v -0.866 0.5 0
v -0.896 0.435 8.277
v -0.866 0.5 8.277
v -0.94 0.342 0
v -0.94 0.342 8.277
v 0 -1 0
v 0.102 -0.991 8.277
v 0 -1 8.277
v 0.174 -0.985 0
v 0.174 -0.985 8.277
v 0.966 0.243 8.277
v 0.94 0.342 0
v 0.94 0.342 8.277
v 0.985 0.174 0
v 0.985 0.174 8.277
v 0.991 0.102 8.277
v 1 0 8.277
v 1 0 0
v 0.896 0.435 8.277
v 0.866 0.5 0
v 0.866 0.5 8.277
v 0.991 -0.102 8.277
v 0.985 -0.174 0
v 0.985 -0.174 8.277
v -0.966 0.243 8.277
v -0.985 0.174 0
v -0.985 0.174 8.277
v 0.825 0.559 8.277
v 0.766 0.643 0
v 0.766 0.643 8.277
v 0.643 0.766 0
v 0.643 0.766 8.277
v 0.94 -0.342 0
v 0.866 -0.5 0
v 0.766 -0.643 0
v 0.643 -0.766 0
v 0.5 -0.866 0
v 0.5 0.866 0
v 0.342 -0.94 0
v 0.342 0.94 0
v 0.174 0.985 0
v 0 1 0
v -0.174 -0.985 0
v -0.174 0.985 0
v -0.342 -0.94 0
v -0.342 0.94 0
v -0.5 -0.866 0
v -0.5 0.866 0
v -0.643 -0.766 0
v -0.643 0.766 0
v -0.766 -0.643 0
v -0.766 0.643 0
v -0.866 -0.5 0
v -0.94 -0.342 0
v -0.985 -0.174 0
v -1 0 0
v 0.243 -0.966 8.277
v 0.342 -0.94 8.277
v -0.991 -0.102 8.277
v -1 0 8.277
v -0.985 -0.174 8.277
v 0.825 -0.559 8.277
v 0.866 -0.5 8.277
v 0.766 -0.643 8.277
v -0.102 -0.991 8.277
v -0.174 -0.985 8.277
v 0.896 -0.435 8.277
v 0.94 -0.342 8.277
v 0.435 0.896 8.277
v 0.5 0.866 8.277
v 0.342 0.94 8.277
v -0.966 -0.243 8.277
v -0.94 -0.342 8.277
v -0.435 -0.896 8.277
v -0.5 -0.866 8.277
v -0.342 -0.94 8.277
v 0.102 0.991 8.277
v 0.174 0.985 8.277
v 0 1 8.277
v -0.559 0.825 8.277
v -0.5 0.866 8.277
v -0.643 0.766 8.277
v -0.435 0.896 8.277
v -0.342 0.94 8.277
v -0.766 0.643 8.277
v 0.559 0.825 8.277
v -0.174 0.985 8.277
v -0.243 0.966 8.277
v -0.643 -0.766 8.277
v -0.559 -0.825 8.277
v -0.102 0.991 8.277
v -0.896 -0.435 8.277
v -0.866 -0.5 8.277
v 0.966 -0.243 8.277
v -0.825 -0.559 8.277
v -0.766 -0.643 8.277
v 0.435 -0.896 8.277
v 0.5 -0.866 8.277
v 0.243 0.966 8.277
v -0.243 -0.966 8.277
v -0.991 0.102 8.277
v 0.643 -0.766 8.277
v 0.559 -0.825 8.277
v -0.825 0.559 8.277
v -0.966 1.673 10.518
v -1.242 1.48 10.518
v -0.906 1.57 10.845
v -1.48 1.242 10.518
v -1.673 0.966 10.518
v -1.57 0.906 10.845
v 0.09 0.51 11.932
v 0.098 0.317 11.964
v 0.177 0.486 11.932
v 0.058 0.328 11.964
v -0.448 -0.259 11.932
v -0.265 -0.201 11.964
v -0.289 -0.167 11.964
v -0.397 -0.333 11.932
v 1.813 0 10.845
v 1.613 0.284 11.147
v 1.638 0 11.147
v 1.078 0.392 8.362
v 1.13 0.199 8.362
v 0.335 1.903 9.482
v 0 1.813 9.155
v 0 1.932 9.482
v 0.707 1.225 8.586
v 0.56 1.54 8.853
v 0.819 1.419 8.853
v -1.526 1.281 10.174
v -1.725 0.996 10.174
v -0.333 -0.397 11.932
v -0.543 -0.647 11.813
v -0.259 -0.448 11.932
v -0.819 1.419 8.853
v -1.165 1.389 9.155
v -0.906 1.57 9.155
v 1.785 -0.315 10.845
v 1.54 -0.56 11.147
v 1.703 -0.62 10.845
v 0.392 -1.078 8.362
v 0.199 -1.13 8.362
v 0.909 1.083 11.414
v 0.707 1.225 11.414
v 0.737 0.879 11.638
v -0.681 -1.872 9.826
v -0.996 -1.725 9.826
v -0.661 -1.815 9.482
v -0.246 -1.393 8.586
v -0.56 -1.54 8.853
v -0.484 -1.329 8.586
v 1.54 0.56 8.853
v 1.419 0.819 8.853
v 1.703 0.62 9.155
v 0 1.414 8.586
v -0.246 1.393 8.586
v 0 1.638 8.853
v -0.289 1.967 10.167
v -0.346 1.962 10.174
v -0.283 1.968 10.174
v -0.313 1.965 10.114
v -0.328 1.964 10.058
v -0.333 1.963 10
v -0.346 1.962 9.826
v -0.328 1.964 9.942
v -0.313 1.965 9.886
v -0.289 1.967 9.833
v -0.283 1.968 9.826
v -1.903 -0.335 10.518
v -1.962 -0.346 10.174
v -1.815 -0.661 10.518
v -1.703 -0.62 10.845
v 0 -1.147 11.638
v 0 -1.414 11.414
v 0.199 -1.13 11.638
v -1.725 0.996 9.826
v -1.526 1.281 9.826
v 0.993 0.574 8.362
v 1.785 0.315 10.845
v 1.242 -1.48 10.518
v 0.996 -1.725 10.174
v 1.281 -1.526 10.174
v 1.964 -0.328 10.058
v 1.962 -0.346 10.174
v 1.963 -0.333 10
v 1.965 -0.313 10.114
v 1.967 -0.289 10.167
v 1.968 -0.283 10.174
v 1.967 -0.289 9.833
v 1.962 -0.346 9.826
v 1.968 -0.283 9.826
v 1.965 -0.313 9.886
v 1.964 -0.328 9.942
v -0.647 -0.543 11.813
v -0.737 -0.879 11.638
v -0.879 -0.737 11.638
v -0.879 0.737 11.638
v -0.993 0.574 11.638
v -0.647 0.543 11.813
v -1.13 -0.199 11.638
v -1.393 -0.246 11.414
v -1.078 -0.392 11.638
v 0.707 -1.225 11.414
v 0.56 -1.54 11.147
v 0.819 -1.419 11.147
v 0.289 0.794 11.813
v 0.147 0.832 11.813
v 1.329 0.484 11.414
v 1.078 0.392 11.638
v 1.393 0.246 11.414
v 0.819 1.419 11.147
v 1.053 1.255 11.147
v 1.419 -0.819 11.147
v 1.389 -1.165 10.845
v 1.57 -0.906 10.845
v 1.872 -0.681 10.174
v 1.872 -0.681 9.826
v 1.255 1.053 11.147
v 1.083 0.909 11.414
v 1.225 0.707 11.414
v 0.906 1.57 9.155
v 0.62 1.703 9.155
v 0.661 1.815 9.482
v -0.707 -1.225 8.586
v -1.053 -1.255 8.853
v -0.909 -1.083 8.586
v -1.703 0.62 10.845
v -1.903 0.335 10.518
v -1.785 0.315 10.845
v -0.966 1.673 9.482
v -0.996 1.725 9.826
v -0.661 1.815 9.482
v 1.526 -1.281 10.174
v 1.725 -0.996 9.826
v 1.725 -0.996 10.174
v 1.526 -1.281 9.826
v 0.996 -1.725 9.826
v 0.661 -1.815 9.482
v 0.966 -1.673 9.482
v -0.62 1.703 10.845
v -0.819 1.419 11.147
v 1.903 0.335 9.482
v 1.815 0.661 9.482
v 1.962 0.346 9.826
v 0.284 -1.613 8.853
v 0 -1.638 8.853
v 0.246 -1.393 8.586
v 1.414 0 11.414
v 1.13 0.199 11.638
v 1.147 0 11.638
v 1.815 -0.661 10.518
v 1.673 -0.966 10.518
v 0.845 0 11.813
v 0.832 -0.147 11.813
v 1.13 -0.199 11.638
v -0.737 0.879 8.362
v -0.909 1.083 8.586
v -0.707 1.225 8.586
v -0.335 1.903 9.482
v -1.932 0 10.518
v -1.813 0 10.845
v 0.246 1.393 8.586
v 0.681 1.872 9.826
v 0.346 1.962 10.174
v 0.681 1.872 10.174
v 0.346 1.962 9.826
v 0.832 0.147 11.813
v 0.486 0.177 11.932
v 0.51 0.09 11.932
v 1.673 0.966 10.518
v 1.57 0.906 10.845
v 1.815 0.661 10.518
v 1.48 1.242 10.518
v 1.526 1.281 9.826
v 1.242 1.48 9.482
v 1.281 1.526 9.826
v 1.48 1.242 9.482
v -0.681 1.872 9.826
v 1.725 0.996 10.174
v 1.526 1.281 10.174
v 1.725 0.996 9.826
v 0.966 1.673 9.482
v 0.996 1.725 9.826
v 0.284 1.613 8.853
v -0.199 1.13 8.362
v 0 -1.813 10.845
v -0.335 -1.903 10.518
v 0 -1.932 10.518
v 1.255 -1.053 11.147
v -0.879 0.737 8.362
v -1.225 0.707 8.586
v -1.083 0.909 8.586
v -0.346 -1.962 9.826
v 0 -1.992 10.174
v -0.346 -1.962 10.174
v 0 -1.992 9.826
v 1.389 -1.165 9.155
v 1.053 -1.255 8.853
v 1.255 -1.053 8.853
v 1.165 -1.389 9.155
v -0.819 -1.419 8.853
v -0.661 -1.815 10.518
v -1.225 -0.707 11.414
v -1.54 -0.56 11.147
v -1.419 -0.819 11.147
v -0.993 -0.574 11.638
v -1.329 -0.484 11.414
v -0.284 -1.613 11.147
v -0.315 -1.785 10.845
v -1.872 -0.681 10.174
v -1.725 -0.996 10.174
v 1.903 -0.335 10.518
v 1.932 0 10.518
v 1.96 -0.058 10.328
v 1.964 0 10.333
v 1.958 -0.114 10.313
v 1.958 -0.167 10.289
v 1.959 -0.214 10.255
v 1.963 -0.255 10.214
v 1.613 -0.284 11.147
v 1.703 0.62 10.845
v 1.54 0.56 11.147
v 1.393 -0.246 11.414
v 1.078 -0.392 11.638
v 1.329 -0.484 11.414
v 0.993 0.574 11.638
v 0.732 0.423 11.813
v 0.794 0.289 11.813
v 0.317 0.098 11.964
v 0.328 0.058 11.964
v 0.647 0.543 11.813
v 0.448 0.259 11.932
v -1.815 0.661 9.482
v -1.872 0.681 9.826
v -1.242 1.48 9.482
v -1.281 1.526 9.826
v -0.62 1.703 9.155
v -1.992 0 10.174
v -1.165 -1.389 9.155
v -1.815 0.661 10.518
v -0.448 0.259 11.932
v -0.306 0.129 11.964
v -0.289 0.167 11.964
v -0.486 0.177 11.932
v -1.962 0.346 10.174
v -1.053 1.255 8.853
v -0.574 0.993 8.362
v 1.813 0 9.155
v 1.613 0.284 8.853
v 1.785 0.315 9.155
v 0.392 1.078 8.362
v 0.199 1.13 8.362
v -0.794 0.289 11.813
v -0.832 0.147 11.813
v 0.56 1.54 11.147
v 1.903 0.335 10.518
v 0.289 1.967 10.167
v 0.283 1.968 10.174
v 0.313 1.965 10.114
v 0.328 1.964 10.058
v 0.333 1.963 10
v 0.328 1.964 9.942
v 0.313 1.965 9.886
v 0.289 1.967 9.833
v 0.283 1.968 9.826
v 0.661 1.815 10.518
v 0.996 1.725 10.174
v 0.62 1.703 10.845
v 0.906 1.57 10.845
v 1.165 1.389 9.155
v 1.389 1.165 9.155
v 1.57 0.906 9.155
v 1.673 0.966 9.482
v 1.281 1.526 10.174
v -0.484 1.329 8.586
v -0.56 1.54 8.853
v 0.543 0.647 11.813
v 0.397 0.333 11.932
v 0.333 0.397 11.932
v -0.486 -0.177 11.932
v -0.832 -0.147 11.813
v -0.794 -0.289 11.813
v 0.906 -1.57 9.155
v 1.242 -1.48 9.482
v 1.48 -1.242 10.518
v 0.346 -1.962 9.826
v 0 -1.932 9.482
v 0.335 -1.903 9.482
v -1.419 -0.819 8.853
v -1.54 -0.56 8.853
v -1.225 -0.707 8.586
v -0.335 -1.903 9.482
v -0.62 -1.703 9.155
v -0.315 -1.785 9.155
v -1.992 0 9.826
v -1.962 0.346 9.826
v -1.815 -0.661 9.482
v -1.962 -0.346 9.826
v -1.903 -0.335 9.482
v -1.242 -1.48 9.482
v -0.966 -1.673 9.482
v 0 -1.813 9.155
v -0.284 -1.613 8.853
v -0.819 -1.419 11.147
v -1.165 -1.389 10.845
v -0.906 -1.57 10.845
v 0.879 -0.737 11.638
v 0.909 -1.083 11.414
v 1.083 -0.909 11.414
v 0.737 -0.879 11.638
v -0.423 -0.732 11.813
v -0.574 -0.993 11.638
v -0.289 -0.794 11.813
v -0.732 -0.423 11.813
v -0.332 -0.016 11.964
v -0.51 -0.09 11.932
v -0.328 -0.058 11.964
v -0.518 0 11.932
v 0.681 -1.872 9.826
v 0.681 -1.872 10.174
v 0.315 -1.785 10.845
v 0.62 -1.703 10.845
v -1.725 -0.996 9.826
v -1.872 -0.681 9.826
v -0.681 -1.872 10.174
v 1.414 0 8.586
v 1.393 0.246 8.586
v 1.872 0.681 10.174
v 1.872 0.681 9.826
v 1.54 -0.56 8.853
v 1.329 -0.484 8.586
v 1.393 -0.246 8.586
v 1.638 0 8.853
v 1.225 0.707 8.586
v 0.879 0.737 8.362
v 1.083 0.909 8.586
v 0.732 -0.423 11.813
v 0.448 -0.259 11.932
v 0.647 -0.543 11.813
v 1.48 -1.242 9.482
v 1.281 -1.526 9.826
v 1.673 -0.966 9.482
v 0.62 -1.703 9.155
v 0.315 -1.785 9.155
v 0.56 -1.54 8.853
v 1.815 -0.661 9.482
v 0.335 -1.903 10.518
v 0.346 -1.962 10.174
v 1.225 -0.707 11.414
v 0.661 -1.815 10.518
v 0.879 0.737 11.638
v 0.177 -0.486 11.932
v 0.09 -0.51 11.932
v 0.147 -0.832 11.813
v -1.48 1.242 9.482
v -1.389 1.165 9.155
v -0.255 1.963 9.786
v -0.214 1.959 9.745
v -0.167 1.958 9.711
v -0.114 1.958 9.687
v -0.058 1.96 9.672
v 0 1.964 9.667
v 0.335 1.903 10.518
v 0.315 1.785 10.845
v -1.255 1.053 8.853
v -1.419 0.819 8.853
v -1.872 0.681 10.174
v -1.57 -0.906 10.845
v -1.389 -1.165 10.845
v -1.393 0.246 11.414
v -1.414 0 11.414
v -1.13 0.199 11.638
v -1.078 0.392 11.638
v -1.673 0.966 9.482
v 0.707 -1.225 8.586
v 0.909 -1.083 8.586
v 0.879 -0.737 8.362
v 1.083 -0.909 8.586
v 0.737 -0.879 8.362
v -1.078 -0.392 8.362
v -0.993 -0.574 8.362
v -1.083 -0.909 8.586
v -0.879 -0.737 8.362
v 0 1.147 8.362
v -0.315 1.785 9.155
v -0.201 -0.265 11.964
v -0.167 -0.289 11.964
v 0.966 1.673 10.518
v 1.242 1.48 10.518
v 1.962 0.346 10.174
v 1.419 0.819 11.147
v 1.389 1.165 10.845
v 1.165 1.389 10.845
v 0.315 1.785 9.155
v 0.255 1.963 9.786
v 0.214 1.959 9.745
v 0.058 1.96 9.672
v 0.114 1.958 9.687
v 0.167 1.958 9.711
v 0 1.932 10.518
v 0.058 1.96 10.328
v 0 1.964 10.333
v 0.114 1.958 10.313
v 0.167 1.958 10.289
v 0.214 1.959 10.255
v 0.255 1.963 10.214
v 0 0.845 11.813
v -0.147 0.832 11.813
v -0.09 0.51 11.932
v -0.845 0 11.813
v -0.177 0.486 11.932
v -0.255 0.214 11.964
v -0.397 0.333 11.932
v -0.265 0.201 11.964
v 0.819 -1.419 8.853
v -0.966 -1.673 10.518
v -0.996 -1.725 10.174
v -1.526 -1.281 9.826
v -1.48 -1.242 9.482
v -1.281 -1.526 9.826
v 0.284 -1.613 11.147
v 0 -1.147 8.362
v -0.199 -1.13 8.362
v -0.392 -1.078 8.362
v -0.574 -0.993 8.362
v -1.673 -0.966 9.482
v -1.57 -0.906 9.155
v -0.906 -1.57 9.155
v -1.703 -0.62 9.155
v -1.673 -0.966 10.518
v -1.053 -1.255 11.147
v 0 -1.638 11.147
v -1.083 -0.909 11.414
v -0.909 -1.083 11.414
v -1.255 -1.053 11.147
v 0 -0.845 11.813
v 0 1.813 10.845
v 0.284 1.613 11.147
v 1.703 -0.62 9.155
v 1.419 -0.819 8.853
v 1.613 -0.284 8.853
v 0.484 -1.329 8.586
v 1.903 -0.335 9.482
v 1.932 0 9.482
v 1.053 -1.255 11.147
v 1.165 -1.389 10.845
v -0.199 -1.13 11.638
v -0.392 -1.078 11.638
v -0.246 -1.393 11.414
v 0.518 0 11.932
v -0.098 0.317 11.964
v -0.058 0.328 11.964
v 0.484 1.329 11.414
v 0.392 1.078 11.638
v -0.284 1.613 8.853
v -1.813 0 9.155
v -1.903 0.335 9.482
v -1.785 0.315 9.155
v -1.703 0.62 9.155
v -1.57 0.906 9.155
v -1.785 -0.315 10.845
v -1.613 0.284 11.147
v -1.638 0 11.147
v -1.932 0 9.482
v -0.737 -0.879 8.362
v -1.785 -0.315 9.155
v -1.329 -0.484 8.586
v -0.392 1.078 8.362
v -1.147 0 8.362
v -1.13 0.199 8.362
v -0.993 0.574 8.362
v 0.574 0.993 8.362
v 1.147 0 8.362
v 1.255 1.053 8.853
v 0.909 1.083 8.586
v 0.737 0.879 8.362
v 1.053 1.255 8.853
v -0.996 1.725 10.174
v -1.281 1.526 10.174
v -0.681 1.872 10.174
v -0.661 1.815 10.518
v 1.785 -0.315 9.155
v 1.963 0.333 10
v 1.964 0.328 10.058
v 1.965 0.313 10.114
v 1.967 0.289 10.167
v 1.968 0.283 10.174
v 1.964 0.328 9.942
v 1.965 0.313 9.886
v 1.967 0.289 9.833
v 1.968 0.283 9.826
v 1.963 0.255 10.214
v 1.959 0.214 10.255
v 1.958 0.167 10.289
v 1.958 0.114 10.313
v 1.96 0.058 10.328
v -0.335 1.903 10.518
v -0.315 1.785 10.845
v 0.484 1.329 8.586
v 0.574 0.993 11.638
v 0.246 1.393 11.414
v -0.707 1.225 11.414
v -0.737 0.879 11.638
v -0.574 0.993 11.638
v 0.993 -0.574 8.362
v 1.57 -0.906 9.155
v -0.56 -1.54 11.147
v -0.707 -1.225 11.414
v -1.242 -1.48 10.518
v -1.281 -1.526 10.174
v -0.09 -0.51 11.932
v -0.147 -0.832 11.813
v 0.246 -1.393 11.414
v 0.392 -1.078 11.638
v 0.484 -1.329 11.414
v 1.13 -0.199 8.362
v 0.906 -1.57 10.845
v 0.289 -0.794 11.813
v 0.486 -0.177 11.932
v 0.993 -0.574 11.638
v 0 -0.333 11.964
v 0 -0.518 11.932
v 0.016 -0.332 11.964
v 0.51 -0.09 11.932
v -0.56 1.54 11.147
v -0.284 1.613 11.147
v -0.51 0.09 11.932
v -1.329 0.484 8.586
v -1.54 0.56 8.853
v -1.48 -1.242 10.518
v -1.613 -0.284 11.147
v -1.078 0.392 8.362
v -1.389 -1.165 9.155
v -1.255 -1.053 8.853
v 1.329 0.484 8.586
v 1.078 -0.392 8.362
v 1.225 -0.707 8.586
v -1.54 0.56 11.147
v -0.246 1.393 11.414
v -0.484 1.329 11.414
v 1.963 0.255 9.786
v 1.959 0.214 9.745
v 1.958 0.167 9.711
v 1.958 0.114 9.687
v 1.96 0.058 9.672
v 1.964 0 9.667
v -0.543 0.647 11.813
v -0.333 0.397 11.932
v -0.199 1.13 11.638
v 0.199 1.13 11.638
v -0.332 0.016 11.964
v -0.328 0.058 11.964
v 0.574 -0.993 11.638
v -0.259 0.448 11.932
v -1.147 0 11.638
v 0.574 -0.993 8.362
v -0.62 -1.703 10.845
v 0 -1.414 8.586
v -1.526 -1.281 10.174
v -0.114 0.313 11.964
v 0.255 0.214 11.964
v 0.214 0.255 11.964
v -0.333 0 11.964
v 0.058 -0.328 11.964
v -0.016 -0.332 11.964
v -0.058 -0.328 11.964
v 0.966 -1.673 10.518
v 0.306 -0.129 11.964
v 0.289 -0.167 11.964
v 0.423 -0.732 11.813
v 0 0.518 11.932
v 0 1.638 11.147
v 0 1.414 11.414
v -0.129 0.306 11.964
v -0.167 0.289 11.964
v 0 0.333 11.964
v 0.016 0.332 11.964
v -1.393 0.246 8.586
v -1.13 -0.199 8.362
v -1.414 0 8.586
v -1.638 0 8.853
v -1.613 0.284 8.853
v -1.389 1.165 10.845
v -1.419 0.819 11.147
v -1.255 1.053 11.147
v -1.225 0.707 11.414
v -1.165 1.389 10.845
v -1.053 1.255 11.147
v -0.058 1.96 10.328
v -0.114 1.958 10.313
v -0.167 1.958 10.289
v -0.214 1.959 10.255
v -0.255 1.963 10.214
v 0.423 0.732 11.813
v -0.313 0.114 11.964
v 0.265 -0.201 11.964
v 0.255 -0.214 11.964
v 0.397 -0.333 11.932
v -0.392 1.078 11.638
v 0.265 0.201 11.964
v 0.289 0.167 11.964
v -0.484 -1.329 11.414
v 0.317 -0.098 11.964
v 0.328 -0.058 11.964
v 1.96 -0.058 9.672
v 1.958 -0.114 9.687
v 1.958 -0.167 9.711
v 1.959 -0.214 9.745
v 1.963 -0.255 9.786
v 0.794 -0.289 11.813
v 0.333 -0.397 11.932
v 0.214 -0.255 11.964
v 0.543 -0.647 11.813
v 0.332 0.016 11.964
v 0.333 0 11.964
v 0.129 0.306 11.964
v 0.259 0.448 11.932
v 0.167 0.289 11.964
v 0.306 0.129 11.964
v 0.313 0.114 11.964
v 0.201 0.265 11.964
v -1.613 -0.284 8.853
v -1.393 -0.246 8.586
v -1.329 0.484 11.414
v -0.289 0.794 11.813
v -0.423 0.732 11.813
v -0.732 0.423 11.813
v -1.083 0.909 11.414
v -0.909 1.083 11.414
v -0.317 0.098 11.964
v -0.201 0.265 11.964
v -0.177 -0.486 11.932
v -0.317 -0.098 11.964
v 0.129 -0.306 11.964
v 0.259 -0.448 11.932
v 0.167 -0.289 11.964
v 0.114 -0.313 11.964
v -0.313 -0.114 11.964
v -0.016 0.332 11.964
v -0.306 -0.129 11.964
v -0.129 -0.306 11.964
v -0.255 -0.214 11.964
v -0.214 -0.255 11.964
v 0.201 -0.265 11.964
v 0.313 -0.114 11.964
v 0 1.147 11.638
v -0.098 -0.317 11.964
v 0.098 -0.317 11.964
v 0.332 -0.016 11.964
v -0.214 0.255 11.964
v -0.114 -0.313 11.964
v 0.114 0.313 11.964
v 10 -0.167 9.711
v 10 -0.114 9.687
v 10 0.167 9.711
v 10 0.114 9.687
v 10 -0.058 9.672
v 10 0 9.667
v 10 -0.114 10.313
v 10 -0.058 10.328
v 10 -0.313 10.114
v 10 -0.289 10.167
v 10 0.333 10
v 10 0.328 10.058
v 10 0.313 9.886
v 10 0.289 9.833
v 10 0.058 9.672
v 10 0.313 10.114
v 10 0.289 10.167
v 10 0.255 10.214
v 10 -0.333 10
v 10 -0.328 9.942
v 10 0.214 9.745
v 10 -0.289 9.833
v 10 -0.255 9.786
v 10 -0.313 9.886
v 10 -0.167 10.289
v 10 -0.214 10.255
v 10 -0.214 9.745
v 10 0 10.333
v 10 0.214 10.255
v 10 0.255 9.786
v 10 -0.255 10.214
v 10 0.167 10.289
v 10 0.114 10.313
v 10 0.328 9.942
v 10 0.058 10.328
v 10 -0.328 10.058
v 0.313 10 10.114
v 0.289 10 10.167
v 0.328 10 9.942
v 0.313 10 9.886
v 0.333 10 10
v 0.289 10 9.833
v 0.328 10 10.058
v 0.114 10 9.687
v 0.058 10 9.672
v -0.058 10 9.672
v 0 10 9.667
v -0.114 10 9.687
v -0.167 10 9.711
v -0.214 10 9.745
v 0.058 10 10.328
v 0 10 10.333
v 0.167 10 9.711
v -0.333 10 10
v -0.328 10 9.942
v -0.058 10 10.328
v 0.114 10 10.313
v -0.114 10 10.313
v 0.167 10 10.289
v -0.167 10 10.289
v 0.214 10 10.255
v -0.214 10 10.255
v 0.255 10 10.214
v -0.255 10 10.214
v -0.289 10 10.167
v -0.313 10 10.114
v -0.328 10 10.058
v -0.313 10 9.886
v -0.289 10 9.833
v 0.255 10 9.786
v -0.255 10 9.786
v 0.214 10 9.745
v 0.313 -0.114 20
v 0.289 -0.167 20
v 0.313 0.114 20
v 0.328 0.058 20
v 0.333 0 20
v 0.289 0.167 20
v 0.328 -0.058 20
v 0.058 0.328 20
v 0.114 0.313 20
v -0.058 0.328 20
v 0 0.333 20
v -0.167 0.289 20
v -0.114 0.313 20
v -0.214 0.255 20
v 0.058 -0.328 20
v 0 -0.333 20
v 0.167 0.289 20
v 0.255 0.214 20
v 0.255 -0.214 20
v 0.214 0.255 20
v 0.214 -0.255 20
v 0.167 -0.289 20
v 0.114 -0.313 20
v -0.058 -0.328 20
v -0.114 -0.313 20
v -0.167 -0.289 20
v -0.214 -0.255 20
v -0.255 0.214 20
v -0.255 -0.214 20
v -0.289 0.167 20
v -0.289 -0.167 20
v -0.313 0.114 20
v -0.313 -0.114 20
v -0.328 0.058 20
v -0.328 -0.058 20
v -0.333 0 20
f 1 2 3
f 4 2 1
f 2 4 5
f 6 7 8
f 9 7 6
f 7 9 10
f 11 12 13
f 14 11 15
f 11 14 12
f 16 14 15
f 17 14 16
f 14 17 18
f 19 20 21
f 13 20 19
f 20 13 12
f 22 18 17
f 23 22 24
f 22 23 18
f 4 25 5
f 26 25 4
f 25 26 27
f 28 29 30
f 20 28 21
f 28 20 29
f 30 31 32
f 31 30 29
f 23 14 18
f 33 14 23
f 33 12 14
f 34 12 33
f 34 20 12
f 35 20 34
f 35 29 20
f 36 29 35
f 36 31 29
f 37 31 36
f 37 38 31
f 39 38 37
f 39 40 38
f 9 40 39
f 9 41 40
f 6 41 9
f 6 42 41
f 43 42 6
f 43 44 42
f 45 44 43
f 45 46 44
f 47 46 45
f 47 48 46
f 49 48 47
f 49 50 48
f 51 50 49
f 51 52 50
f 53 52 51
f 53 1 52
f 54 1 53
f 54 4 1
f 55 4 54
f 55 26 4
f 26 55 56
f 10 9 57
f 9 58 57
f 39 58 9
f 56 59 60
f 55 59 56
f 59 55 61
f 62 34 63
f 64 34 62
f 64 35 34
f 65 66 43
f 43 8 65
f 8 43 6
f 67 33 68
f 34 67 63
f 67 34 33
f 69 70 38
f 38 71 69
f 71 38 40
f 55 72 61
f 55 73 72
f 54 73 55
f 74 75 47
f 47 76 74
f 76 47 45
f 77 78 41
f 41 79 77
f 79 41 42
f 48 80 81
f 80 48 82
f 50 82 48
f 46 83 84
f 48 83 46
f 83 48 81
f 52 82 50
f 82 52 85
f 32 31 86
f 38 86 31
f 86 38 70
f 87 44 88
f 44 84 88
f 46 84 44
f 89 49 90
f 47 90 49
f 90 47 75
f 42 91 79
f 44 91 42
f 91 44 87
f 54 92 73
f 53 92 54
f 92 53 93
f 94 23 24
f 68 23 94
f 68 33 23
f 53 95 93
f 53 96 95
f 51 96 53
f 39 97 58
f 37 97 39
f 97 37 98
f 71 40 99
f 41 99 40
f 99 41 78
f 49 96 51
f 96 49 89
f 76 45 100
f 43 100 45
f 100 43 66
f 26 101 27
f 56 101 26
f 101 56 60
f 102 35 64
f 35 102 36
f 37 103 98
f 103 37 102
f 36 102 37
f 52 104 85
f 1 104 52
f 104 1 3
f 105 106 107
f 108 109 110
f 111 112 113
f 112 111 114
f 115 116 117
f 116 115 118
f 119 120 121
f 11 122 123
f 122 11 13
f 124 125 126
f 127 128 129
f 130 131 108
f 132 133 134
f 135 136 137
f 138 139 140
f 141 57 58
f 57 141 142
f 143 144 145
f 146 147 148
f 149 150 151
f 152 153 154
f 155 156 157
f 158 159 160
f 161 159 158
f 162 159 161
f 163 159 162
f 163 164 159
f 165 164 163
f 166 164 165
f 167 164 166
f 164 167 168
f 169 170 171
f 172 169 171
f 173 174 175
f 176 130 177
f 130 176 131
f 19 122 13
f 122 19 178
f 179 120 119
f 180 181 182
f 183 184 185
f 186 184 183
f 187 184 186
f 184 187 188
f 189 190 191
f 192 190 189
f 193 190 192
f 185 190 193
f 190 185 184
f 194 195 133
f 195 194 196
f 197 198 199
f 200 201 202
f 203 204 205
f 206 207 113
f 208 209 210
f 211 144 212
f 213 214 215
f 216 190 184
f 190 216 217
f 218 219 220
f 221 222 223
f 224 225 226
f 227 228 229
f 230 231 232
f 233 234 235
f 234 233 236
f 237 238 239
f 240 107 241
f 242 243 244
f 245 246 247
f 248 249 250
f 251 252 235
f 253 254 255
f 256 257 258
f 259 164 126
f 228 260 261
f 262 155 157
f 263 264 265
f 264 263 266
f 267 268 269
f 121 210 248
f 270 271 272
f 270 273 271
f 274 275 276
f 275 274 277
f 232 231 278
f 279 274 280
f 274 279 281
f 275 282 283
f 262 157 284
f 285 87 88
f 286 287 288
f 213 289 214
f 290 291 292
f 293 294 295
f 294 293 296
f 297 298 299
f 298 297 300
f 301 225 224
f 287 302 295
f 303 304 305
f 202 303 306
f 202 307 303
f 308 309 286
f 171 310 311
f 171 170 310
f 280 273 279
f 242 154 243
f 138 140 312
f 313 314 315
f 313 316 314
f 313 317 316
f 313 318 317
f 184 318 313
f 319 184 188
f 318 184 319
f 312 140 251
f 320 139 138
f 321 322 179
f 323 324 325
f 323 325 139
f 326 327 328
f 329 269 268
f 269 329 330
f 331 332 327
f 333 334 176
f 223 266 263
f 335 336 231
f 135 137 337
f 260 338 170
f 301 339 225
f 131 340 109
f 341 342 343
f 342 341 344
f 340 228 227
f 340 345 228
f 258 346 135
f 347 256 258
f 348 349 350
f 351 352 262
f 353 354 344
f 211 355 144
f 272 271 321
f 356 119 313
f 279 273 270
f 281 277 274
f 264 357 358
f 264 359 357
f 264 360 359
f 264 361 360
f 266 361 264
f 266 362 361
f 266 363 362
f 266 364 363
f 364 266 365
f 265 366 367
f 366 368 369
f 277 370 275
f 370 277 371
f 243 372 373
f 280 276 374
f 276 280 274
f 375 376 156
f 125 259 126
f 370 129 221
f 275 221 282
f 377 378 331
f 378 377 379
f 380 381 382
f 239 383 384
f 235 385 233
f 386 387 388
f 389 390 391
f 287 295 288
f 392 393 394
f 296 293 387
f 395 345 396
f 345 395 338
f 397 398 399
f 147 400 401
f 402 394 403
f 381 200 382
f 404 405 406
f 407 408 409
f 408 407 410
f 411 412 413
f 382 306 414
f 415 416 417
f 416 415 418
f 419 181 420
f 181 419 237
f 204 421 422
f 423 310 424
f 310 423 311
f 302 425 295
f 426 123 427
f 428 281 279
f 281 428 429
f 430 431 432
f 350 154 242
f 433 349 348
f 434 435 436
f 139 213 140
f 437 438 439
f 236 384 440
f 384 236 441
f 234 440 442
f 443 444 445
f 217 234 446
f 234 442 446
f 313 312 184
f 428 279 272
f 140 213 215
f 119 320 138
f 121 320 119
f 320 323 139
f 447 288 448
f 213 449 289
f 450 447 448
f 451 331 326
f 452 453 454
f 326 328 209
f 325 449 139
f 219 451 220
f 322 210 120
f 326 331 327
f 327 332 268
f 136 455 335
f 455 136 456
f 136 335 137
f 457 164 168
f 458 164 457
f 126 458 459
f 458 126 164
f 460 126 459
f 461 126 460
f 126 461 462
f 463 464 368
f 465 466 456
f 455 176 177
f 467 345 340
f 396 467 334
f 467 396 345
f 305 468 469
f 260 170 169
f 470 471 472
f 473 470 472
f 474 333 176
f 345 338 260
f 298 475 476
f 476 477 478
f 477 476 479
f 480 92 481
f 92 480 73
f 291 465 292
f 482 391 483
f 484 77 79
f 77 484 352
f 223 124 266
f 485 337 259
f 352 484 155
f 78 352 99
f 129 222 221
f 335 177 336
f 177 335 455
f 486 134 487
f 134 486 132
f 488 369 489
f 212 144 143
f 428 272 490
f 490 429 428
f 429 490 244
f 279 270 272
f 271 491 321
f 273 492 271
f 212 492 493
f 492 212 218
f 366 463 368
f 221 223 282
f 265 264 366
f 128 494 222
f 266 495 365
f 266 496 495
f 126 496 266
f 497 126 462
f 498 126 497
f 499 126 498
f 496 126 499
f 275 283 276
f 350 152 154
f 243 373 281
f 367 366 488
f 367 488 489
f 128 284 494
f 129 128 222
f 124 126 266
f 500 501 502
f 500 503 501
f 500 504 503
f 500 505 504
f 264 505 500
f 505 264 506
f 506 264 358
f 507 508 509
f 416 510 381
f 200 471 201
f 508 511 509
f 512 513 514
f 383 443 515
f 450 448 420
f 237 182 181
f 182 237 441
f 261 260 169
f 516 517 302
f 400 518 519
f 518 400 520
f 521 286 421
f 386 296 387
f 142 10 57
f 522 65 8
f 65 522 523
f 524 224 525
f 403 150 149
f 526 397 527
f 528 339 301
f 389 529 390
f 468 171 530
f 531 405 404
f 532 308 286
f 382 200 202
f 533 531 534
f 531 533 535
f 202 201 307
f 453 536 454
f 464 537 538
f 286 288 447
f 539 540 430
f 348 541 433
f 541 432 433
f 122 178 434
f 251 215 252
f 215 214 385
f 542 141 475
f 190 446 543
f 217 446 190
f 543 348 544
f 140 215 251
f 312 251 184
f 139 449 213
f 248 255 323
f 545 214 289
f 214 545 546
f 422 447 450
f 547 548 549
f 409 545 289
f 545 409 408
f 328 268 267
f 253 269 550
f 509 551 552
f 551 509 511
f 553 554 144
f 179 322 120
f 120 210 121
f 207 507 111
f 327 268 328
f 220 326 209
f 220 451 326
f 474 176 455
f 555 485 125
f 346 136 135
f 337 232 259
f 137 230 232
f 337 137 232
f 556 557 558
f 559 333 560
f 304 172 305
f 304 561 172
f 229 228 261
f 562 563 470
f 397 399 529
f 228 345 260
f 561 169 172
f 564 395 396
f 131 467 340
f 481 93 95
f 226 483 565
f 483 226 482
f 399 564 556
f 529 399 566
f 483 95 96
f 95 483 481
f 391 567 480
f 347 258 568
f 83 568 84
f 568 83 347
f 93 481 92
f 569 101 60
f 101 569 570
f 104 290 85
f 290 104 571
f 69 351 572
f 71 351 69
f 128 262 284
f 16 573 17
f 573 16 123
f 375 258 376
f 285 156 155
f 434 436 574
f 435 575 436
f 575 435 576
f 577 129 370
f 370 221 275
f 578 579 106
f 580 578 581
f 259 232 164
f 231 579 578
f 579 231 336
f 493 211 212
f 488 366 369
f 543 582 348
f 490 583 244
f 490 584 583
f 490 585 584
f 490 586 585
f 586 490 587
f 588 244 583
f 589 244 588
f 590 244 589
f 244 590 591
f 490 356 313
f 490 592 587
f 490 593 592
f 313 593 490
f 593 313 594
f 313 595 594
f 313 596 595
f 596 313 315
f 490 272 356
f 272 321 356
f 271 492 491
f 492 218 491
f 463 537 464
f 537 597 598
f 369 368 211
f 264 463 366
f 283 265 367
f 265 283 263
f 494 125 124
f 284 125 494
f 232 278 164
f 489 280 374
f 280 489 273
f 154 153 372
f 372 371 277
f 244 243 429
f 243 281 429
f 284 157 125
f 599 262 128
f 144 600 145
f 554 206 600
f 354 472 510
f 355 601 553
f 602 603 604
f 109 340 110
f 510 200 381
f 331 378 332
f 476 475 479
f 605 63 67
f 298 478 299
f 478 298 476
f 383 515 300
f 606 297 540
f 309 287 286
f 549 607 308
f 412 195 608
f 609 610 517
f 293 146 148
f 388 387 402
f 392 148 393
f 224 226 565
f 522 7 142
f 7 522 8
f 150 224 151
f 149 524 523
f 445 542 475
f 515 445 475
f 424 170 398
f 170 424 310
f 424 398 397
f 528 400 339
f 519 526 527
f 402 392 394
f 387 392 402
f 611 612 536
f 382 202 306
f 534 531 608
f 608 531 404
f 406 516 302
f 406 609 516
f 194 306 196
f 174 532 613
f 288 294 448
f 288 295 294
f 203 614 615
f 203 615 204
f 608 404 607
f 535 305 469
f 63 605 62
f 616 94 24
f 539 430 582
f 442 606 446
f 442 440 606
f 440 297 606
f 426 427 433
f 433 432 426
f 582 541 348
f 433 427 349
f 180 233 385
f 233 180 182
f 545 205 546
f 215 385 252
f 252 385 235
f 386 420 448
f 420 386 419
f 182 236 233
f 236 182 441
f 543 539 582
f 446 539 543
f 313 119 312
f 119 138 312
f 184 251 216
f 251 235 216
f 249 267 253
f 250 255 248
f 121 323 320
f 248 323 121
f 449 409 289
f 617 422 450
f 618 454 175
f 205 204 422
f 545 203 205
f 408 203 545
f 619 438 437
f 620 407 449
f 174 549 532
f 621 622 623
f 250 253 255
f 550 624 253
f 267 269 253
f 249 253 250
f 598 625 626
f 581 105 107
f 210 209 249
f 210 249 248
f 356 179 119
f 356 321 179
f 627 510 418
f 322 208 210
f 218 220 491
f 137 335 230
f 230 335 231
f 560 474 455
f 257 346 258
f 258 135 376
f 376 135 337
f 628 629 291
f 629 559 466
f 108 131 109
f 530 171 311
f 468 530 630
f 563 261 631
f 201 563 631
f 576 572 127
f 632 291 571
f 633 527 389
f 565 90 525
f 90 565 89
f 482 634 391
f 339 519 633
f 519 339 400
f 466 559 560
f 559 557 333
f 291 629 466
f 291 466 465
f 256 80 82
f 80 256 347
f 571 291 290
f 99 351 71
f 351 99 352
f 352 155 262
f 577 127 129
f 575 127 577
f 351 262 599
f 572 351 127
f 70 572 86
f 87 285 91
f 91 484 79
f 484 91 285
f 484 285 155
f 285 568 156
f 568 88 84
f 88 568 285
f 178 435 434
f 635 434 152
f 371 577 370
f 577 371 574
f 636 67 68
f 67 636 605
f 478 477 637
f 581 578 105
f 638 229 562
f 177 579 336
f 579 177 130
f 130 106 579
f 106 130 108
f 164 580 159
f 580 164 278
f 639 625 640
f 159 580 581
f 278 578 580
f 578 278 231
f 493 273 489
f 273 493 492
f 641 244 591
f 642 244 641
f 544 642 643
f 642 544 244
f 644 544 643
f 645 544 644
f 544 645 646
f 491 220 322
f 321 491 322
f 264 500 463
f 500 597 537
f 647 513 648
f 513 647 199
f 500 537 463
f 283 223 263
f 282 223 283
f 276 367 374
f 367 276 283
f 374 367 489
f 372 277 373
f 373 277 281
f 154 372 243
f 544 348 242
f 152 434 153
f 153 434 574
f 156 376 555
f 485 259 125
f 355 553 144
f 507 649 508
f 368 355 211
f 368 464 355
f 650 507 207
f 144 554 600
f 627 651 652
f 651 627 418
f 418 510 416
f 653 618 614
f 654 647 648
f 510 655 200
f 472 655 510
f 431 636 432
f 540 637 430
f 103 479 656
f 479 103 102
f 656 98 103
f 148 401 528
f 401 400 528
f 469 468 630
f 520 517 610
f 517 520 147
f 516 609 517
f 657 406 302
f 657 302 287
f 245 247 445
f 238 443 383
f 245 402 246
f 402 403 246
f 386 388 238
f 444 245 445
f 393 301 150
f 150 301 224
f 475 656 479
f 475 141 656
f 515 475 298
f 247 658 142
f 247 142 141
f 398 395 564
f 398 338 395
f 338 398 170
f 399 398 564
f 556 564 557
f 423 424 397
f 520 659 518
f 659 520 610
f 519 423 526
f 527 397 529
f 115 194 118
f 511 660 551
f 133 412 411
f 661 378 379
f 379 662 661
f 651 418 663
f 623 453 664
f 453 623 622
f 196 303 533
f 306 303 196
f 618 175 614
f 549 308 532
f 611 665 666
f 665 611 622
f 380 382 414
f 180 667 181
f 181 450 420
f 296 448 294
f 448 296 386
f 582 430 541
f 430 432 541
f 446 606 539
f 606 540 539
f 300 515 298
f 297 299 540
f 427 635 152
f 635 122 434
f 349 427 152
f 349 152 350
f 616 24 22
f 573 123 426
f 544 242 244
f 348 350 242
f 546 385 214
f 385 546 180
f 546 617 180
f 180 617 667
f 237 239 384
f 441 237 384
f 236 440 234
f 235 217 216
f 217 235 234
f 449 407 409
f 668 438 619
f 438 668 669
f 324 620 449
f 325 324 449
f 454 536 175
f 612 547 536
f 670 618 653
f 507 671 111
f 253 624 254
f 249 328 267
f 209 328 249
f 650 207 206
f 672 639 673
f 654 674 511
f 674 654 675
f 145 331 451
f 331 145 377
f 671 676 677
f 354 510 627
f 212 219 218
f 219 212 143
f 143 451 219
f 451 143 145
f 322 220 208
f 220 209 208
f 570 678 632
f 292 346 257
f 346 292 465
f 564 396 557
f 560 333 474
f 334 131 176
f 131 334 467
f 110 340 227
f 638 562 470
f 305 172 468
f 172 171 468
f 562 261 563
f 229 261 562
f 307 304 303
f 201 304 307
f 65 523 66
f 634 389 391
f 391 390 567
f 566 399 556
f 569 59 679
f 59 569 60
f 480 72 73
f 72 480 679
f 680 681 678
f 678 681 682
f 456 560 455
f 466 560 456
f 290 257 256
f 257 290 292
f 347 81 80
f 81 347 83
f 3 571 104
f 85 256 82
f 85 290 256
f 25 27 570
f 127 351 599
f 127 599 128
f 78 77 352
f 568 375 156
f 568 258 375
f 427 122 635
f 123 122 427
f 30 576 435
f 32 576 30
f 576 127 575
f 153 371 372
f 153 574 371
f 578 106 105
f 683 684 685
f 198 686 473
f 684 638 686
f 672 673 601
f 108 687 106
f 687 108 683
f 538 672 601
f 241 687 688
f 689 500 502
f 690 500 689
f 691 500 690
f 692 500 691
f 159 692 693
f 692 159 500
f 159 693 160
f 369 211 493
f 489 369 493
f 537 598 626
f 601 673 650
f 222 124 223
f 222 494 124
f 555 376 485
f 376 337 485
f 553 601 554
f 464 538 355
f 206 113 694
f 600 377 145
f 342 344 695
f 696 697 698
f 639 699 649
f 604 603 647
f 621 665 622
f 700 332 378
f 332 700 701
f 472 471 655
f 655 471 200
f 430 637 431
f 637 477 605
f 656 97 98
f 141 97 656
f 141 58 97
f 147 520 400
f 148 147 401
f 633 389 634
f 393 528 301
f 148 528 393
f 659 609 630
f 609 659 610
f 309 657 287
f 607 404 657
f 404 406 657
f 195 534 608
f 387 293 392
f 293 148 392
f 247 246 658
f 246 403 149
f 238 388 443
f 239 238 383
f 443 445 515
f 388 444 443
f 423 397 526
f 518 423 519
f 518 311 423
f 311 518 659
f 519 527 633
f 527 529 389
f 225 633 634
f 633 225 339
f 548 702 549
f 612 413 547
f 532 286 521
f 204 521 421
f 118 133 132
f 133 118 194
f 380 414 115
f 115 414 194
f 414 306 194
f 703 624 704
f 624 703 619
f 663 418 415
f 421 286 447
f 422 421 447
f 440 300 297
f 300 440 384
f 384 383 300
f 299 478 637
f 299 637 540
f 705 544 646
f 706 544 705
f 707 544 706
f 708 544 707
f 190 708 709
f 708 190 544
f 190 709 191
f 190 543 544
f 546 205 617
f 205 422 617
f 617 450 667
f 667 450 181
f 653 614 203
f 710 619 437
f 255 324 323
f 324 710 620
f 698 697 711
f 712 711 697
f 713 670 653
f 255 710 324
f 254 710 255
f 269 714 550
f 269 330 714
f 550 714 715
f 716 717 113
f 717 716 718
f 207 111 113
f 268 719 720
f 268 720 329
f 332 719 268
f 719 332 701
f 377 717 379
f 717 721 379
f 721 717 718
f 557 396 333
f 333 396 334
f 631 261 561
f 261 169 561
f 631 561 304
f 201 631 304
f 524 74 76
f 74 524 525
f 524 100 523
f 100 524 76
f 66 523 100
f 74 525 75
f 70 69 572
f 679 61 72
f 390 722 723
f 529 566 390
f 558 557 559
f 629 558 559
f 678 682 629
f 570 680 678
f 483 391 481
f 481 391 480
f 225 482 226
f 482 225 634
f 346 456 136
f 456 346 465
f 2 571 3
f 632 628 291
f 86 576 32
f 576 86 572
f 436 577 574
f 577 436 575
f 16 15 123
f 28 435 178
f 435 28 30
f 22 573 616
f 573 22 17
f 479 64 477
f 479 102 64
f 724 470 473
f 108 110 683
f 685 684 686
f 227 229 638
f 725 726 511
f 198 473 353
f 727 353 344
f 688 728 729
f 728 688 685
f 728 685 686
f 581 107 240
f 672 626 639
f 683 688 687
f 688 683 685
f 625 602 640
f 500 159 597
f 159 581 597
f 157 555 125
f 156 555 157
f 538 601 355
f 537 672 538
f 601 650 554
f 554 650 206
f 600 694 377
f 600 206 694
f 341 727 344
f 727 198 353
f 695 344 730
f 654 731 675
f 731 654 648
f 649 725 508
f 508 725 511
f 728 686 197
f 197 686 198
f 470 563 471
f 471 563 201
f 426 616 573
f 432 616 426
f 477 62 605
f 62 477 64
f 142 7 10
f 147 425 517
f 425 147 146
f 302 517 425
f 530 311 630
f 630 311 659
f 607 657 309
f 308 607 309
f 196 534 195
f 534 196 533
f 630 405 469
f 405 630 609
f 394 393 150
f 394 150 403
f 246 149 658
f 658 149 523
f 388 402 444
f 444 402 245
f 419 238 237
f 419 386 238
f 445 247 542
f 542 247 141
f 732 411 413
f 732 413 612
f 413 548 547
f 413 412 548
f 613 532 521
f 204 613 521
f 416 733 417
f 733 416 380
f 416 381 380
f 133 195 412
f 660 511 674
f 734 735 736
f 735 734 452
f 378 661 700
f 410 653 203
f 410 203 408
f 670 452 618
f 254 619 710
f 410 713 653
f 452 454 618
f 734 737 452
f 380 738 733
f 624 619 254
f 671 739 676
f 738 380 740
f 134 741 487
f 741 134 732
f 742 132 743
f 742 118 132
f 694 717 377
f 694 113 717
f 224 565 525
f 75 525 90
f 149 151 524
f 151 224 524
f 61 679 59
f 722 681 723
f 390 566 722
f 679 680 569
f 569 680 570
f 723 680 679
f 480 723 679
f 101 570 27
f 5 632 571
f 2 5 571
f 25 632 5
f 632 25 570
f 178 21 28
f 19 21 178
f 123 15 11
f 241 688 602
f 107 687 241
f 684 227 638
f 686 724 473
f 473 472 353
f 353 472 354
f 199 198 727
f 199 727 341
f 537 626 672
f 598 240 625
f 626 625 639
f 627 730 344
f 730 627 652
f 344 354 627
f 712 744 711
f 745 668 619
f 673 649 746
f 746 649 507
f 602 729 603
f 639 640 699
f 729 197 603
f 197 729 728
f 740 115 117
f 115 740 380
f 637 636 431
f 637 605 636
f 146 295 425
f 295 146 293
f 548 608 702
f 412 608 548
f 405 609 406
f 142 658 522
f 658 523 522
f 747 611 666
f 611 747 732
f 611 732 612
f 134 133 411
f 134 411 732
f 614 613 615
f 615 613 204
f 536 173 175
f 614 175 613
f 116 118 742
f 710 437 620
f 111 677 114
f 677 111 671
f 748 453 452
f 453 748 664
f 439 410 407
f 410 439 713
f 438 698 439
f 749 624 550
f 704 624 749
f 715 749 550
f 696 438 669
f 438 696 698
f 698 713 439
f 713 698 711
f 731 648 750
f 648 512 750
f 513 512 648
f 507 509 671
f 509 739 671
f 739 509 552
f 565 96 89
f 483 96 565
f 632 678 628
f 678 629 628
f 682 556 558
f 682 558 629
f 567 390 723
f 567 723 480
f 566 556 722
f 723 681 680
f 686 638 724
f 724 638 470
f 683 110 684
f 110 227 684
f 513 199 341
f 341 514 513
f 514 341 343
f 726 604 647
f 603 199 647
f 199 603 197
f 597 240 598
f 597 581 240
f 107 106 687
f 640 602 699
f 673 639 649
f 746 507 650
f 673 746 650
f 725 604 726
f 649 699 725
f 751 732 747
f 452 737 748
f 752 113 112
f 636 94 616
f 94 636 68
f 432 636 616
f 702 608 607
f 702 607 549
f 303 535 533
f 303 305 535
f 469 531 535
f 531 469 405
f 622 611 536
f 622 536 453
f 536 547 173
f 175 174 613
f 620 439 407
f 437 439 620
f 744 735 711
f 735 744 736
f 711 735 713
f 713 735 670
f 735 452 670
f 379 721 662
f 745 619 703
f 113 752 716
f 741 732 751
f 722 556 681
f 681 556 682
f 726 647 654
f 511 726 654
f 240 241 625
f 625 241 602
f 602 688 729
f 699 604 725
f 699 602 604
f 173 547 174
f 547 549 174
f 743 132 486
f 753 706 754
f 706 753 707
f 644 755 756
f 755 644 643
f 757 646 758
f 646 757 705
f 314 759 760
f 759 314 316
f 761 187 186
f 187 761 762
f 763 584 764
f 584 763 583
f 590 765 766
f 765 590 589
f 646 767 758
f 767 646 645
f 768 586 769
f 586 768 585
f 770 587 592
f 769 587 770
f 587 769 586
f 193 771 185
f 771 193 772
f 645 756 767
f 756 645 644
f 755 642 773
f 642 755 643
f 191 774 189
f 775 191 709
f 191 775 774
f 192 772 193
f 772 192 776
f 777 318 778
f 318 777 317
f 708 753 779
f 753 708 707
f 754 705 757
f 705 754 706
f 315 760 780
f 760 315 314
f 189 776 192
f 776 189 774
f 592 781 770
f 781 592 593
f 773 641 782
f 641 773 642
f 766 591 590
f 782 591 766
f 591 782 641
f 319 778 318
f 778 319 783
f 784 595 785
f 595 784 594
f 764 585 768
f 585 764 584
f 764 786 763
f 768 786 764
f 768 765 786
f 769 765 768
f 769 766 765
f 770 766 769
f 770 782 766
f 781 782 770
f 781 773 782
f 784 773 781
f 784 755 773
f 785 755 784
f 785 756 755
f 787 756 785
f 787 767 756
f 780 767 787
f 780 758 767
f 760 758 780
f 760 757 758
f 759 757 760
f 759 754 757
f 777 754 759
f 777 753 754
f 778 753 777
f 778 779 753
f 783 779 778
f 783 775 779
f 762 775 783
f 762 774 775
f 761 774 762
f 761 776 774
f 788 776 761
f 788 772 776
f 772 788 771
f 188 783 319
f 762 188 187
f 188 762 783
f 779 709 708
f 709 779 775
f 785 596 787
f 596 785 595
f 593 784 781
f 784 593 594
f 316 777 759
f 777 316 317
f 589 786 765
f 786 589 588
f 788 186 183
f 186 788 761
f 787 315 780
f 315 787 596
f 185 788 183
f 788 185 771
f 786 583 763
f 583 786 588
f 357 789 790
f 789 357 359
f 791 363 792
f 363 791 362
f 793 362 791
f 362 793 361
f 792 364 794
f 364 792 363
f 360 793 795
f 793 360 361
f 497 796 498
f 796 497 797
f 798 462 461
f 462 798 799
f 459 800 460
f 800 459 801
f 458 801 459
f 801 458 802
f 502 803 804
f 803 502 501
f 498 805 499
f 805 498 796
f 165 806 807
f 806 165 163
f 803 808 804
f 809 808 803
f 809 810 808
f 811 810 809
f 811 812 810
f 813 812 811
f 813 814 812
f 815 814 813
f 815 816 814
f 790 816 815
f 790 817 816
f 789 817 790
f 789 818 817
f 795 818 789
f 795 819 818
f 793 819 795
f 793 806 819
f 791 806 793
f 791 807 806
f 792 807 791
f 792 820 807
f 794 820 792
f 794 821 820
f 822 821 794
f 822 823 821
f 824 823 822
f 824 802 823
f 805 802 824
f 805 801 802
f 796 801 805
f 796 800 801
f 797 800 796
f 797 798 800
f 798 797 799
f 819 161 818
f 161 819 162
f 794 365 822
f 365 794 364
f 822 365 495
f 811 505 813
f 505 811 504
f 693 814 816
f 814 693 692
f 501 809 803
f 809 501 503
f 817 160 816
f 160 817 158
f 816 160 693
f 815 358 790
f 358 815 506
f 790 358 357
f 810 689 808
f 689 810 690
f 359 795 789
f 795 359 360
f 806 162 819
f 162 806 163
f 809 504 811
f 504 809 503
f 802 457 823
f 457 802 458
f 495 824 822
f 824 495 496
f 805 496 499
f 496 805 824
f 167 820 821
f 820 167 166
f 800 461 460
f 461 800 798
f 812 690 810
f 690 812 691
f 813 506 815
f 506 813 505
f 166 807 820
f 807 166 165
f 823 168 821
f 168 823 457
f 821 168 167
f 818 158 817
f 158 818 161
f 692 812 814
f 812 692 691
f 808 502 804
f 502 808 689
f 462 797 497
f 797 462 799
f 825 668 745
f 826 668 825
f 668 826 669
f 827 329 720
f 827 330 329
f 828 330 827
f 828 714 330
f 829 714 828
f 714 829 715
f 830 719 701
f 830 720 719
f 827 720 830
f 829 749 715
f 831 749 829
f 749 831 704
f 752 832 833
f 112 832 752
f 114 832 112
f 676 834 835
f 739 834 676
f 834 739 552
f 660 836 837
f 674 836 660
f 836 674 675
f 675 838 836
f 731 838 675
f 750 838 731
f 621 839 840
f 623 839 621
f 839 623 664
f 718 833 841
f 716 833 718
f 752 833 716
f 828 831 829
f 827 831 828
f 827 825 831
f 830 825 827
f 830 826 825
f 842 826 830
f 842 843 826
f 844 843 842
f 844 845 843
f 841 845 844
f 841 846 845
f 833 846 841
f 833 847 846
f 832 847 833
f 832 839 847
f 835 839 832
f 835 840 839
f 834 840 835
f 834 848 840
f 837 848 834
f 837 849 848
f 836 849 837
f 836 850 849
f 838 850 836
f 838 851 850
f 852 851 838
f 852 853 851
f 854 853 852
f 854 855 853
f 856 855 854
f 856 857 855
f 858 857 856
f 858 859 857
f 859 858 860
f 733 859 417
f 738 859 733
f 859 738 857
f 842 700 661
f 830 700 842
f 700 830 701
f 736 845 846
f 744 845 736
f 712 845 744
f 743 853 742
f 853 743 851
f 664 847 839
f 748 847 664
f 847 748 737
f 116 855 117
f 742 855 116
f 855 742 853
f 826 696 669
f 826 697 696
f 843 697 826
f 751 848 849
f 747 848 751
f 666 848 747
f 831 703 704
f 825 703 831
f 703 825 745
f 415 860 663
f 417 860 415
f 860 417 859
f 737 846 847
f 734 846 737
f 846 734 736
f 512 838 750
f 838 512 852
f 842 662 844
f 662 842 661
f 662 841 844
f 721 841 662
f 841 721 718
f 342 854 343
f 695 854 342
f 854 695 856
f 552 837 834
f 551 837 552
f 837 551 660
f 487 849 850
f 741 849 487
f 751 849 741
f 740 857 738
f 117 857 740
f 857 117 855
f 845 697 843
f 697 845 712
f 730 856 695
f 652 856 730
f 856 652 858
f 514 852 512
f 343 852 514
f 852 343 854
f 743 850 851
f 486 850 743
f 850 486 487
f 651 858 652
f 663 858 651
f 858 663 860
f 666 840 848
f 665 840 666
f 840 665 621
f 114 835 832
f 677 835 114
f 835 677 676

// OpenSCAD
// Модель соединения в виде цилиндра и сферы

// Перемещение
translation = [0, 0, 10];

// Вращение
rotation = [0, 0, 0];

// Радиус соединения
linkRadius = 1;

// Радиус шарнира
jointRadius = 2;

// Качество
$fn = 36;

// Отладка
debug = true;

// Модуль соединения (вдоль оси z)
module joint(l = norm(translation), r1 = linkRadius, r2 = jointRadius)
{
    cylinder(l, r1, r1);
    translate([0, 0, l]) sphere(r2);
};

// Модуль базиса
module basis(l = 10 * linkRadius, r1 = linkRadius / 3)
{
    color("red") rotate([0, 90, 0]) cylinder(l, r1, r1);
    color("green") rotate([-90, 0, 0]) cylinder(l, r1, r1);
    color("blue") cylinder(l, r1, r1);
}

// Бинормаль к двум векторам
function binormal(v1, v2) = cross(v1, v2);

// Угол между двумя векторами
function angle(v1, v2) = acos((v1 / norm(v1)) * (v2 / norm(v2)));

// Соединение
rotate(angle(translation, [0, 0, 1]), binormal([0, 0, 1], translation)) joint();

// Базис (в режиме отладки)
if (debug) translate(translation) rotate(rotation) basis();
